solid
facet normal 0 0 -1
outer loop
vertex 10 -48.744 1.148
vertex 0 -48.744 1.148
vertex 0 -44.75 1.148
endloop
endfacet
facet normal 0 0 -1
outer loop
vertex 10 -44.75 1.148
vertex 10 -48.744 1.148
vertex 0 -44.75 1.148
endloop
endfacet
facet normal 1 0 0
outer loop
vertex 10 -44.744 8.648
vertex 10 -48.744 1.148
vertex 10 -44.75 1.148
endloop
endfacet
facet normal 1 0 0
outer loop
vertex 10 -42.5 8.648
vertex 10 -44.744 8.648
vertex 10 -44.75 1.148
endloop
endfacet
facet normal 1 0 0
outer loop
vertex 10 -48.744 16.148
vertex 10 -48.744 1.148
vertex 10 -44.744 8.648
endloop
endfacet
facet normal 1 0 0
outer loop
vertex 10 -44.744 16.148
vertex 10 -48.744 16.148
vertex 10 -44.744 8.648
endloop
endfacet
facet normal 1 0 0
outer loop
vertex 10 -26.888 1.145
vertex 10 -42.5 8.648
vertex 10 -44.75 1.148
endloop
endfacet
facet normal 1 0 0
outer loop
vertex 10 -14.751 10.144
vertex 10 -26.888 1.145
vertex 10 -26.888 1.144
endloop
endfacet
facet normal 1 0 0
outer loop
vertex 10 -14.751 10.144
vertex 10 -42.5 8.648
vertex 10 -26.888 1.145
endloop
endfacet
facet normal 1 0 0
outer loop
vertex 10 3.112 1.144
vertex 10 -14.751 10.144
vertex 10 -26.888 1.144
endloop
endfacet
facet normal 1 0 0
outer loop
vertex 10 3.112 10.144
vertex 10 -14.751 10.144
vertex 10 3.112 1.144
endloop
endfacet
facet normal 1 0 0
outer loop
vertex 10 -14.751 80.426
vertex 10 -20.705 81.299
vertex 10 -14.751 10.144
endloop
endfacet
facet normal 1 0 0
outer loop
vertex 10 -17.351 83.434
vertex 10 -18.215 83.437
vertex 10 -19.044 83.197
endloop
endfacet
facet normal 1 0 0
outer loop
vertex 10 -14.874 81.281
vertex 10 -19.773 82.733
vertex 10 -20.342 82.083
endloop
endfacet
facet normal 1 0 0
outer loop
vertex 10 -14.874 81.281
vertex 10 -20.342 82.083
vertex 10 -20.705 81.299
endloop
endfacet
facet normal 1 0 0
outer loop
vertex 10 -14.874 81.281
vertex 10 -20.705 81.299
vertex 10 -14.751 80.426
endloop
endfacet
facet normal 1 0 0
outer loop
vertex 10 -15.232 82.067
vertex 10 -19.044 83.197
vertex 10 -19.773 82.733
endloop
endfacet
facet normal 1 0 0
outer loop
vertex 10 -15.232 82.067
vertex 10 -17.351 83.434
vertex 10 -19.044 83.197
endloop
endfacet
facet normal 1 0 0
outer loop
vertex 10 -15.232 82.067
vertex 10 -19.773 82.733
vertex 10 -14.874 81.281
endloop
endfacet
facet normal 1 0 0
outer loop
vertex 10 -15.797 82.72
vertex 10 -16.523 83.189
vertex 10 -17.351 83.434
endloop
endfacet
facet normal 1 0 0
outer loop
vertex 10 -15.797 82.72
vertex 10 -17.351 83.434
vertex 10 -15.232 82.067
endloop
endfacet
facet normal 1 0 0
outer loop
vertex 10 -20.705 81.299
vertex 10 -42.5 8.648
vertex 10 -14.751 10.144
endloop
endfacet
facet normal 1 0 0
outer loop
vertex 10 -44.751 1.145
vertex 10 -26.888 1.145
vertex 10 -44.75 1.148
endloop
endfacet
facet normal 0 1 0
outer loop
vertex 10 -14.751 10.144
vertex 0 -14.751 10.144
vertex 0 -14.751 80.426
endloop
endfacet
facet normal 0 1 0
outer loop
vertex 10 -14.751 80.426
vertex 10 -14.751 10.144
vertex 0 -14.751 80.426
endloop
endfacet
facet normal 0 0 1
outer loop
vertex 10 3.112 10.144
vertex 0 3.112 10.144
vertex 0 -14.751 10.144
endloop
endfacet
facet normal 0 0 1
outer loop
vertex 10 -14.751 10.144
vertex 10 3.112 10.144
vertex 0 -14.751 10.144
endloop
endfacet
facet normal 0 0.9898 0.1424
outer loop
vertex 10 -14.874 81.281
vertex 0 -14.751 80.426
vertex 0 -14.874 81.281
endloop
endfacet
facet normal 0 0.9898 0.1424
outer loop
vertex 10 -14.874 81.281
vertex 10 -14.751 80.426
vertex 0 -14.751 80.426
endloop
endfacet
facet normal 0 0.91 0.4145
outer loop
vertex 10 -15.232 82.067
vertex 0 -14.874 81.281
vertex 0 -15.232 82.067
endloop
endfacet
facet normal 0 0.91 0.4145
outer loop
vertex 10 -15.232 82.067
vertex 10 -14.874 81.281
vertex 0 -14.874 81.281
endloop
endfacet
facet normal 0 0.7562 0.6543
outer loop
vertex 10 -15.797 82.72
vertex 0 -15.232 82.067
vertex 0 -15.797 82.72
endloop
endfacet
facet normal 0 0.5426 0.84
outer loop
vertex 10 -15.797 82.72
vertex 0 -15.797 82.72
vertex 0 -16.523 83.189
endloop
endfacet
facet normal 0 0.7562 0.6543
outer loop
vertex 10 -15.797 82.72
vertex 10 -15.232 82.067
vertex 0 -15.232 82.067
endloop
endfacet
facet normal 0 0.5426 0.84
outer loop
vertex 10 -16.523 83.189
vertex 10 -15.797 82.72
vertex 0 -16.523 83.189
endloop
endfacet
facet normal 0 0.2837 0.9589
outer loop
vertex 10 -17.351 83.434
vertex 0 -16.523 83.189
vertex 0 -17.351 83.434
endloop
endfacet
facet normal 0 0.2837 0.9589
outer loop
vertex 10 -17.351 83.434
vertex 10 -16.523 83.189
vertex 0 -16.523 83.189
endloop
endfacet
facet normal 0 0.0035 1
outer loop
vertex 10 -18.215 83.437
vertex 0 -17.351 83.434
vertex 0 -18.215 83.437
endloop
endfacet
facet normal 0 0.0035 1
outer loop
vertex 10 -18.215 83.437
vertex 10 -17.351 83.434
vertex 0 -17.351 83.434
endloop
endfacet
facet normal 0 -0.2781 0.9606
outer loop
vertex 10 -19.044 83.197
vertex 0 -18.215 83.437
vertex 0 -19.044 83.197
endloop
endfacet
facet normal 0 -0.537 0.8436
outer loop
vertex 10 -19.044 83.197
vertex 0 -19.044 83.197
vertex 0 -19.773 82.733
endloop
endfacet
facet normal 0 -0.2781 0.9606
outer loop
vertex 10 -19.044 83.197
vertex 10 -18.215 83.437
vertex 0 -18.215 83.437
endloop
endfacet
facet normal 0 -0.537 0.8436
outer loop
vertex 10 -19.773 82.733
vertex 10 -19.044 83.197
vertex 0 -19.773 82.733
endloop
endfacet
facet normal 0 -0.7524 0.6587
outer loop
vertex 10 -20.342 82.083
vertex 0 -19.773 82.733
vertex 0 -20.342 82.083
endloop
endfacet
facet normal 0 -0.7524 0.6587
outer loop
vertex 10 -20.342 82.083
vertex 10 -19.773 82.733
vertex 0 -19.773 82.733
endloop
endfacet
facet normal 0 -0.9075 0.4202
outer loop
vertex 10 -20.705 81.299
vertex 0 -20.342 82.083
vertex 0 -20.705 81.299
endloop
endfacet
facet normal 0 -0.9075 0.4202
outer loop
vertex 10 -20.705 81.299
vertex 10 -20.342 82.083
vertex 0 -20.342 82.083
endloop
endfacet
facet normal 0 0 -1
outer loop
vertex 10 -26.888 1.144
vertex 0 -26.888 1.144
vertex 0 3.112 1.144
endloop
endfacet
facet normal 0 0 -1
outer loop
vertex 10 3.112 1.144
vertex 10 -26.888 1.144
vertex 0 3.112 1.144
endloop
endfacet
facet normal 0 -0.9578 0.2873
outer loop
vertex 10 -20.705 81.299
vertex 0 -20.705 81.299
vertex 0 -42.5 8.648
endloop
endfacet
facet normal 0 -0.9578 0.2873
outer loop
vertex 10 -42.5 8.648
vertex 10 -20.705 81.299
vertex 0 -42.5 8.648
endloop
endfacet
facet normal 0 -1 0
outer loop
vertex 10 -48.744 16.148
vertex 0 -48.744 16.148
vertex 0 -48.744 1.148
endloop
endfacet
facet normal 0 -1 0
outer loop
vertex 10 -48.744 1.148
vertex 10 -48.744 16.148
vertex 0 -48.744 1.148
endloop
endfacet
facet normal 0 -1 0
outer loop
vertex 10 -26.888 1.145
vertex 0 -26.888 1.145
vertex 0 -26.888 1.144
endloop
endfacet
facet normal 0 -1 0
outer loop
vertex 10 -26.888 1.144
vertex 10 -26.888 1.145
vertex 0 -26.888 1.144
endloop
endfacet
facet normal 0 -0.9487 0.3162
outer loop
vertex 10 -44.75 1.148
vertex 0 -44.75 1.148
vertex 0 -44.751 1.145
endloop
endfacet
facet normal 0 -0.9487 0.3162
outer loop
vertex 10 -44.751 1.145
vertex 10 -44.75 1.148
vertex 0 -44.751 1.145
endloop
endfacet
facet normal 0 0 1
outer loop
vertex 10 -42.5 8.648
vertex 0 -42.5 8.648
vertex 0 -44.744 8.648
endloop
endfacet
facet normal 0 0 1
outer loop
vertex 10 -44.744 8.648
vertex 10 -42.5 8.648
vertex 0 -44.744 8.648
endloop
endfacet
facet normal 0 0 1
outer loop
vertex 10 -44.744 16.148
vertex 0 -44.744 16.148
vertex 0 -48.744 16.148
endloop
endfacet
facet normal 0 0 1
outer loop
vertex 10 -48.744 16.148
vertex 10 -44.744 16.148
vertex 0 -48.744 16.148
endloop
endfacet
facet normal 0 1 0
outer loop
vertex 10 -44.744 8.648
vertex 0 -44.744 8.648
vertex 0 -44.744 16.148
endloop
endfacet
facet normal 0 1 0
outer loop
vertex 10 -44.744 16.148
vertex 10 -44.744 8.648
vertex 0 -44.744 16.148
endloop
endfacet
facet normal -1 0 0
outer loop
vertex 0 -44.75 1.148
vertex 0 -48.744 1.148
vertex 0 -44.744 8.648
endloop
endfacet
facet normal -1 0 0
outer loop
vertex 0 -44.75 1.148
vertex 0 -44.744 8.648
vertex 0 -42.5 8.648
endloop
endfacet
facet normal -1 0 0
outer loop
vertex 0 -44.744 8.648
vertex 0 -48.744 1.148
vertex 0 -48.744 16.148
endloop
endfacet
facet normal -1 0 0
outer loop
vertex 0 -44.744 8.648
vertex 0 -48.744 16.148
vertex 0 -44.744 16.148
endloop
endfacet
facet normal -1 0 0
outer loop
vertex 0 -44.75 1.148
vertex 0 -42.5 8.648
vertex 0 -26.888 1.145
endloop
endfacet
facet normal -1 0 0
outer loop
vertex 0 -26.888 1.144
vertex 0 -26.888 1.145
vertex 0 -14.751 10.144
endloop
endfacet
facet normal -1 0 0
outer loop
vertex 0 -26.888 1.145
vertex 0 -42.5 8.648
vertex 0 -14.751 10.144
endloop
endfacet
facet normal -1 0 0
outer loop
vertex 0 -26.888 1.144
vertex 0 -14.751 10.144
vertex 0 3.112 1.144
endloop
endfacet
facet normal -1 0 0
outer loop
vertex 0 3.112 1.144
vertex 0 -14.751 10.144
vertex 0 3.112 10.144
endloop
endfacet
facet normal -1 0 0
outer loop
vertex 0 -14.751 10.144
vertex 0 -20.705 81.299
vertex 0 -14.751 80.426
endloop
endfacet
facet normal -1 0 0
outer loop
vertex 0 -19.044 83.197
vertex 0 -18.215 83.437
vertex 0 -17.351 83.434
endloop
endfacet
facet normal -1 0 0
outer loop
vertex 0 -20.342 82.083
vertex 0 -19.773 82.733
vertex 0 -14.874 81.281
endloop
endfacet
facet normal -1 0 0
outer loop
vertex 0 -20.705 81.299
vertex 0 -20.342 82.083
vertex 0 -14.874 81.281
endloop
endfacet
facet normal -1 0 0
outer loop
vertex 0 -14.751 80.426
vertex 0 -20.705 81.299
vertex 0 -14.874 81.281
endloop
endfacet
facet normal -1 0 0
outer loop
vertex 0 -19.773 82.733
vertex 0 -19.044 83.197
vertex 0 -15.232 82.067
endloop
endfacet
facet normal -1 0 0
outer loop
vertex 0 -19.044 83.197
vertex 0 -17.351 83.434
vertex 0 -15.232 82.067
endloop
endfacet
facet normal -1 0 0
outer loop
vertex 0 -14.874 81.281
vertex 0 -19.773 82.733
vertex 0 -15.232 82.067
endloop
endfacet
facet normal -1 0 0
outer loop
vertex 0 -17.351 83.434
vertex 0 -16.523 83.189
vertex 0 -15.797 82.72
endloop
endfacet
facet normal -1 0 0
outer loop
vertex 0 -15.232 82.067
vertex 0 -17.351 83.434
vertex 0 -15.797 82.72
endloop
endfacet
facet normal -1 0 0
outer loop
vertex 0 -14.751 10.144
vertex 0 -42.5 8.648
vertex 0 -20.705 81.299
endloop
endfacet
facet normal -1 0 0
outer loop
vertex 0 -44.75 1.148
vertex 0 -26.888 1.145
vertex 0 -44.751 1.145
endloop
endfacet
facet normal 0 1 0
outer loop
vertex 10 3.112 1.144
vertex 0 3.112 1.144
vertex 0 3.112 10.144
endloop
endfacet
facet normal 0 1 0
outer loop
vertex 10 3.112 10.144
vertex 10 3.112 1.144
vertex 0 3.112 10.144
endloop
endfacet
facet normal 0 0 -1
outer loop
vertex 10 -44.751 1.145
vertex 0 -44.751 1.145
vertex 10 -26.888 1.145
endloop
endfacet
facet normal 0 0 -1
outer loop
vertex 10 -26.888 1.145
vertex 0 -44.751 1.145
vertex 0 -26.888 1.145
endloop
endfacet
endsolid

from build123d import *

# Parameters (mm, degrees)
F0_W     = 12.1363507145
F0_H     = 8.9991581862
F1_DEPTH = 10
F2_R     = 3.0408929123


with BuildPart() as f1:
    # F0 (on Right) → F1 (new body)
    with BuildSketch(Plane.YZ):
        Polygon((-14.7514826591, 1.1445179262), (-26.8878333736, 1.1445179262), (-26.8878333736, 1.1436761124), (3.1121666264, 1.1436761124), (3.1121666264, 10.1436761124), (-14.7514826591, 10.1436761124), align=None)
        with Locations((-20.8196580164, 5.6440970193)):
            Rectangle(F0_W, F0_H)
        Polygon((-44.7503355374, 1.1483416653), (-44.7514826591, 1.1445179262), (-26.8878333736, 1.1445179262), (-26.8878333736, 10.1436761124), (-14.7514826591, 10.1436761124), (-14.7514826591, 101.1445179262), (-42.5003355374, 8.6483416653), (-40.2435733936, 8.6483416653), (-40.2435733936, 1.1483416653), (-44.7435733936, 1.1483416653), align=None)
        Polygon((-48.7435733936, 1.1483416653), (-44.7503355374, 1.1483416653), (-44.7435733936, 1.1708821449), (-44.7435733936, 8.6483416653), (-44.7435733936, 16.1483416653), (-48.7435733936, 16.1483416653), align=None)
        Polygon((-44.7435733936, 8.6483416653), (-44.7435733936, 1.1708821449), (-42.5003355374, 8.6483416653), align=None)
        Polygon((-42.5003355374, 8.6483416653), (-44.7435733936, 1.1708821449), (-44.7435733936, 1.1483416653), (-40.2435733936, 1.1483416653), (-40.2435733936, 8.6483416653), align=None)
        Polygon((-44.7435733936, 1.1708821449), (-44.7503355374, 1.1483416653), (-44.7435733936, 1.1483416653), align=None)
    extrude(amount=F1_DEPTH)

    # F2
    f2_edges = [f1.edges().sort_by_distance(p)[0] for p in [
        (5, -14.751483, 101.144518),
    ]]
    fillet(f2_edges, radius=F2_R)


solid = f1.part
